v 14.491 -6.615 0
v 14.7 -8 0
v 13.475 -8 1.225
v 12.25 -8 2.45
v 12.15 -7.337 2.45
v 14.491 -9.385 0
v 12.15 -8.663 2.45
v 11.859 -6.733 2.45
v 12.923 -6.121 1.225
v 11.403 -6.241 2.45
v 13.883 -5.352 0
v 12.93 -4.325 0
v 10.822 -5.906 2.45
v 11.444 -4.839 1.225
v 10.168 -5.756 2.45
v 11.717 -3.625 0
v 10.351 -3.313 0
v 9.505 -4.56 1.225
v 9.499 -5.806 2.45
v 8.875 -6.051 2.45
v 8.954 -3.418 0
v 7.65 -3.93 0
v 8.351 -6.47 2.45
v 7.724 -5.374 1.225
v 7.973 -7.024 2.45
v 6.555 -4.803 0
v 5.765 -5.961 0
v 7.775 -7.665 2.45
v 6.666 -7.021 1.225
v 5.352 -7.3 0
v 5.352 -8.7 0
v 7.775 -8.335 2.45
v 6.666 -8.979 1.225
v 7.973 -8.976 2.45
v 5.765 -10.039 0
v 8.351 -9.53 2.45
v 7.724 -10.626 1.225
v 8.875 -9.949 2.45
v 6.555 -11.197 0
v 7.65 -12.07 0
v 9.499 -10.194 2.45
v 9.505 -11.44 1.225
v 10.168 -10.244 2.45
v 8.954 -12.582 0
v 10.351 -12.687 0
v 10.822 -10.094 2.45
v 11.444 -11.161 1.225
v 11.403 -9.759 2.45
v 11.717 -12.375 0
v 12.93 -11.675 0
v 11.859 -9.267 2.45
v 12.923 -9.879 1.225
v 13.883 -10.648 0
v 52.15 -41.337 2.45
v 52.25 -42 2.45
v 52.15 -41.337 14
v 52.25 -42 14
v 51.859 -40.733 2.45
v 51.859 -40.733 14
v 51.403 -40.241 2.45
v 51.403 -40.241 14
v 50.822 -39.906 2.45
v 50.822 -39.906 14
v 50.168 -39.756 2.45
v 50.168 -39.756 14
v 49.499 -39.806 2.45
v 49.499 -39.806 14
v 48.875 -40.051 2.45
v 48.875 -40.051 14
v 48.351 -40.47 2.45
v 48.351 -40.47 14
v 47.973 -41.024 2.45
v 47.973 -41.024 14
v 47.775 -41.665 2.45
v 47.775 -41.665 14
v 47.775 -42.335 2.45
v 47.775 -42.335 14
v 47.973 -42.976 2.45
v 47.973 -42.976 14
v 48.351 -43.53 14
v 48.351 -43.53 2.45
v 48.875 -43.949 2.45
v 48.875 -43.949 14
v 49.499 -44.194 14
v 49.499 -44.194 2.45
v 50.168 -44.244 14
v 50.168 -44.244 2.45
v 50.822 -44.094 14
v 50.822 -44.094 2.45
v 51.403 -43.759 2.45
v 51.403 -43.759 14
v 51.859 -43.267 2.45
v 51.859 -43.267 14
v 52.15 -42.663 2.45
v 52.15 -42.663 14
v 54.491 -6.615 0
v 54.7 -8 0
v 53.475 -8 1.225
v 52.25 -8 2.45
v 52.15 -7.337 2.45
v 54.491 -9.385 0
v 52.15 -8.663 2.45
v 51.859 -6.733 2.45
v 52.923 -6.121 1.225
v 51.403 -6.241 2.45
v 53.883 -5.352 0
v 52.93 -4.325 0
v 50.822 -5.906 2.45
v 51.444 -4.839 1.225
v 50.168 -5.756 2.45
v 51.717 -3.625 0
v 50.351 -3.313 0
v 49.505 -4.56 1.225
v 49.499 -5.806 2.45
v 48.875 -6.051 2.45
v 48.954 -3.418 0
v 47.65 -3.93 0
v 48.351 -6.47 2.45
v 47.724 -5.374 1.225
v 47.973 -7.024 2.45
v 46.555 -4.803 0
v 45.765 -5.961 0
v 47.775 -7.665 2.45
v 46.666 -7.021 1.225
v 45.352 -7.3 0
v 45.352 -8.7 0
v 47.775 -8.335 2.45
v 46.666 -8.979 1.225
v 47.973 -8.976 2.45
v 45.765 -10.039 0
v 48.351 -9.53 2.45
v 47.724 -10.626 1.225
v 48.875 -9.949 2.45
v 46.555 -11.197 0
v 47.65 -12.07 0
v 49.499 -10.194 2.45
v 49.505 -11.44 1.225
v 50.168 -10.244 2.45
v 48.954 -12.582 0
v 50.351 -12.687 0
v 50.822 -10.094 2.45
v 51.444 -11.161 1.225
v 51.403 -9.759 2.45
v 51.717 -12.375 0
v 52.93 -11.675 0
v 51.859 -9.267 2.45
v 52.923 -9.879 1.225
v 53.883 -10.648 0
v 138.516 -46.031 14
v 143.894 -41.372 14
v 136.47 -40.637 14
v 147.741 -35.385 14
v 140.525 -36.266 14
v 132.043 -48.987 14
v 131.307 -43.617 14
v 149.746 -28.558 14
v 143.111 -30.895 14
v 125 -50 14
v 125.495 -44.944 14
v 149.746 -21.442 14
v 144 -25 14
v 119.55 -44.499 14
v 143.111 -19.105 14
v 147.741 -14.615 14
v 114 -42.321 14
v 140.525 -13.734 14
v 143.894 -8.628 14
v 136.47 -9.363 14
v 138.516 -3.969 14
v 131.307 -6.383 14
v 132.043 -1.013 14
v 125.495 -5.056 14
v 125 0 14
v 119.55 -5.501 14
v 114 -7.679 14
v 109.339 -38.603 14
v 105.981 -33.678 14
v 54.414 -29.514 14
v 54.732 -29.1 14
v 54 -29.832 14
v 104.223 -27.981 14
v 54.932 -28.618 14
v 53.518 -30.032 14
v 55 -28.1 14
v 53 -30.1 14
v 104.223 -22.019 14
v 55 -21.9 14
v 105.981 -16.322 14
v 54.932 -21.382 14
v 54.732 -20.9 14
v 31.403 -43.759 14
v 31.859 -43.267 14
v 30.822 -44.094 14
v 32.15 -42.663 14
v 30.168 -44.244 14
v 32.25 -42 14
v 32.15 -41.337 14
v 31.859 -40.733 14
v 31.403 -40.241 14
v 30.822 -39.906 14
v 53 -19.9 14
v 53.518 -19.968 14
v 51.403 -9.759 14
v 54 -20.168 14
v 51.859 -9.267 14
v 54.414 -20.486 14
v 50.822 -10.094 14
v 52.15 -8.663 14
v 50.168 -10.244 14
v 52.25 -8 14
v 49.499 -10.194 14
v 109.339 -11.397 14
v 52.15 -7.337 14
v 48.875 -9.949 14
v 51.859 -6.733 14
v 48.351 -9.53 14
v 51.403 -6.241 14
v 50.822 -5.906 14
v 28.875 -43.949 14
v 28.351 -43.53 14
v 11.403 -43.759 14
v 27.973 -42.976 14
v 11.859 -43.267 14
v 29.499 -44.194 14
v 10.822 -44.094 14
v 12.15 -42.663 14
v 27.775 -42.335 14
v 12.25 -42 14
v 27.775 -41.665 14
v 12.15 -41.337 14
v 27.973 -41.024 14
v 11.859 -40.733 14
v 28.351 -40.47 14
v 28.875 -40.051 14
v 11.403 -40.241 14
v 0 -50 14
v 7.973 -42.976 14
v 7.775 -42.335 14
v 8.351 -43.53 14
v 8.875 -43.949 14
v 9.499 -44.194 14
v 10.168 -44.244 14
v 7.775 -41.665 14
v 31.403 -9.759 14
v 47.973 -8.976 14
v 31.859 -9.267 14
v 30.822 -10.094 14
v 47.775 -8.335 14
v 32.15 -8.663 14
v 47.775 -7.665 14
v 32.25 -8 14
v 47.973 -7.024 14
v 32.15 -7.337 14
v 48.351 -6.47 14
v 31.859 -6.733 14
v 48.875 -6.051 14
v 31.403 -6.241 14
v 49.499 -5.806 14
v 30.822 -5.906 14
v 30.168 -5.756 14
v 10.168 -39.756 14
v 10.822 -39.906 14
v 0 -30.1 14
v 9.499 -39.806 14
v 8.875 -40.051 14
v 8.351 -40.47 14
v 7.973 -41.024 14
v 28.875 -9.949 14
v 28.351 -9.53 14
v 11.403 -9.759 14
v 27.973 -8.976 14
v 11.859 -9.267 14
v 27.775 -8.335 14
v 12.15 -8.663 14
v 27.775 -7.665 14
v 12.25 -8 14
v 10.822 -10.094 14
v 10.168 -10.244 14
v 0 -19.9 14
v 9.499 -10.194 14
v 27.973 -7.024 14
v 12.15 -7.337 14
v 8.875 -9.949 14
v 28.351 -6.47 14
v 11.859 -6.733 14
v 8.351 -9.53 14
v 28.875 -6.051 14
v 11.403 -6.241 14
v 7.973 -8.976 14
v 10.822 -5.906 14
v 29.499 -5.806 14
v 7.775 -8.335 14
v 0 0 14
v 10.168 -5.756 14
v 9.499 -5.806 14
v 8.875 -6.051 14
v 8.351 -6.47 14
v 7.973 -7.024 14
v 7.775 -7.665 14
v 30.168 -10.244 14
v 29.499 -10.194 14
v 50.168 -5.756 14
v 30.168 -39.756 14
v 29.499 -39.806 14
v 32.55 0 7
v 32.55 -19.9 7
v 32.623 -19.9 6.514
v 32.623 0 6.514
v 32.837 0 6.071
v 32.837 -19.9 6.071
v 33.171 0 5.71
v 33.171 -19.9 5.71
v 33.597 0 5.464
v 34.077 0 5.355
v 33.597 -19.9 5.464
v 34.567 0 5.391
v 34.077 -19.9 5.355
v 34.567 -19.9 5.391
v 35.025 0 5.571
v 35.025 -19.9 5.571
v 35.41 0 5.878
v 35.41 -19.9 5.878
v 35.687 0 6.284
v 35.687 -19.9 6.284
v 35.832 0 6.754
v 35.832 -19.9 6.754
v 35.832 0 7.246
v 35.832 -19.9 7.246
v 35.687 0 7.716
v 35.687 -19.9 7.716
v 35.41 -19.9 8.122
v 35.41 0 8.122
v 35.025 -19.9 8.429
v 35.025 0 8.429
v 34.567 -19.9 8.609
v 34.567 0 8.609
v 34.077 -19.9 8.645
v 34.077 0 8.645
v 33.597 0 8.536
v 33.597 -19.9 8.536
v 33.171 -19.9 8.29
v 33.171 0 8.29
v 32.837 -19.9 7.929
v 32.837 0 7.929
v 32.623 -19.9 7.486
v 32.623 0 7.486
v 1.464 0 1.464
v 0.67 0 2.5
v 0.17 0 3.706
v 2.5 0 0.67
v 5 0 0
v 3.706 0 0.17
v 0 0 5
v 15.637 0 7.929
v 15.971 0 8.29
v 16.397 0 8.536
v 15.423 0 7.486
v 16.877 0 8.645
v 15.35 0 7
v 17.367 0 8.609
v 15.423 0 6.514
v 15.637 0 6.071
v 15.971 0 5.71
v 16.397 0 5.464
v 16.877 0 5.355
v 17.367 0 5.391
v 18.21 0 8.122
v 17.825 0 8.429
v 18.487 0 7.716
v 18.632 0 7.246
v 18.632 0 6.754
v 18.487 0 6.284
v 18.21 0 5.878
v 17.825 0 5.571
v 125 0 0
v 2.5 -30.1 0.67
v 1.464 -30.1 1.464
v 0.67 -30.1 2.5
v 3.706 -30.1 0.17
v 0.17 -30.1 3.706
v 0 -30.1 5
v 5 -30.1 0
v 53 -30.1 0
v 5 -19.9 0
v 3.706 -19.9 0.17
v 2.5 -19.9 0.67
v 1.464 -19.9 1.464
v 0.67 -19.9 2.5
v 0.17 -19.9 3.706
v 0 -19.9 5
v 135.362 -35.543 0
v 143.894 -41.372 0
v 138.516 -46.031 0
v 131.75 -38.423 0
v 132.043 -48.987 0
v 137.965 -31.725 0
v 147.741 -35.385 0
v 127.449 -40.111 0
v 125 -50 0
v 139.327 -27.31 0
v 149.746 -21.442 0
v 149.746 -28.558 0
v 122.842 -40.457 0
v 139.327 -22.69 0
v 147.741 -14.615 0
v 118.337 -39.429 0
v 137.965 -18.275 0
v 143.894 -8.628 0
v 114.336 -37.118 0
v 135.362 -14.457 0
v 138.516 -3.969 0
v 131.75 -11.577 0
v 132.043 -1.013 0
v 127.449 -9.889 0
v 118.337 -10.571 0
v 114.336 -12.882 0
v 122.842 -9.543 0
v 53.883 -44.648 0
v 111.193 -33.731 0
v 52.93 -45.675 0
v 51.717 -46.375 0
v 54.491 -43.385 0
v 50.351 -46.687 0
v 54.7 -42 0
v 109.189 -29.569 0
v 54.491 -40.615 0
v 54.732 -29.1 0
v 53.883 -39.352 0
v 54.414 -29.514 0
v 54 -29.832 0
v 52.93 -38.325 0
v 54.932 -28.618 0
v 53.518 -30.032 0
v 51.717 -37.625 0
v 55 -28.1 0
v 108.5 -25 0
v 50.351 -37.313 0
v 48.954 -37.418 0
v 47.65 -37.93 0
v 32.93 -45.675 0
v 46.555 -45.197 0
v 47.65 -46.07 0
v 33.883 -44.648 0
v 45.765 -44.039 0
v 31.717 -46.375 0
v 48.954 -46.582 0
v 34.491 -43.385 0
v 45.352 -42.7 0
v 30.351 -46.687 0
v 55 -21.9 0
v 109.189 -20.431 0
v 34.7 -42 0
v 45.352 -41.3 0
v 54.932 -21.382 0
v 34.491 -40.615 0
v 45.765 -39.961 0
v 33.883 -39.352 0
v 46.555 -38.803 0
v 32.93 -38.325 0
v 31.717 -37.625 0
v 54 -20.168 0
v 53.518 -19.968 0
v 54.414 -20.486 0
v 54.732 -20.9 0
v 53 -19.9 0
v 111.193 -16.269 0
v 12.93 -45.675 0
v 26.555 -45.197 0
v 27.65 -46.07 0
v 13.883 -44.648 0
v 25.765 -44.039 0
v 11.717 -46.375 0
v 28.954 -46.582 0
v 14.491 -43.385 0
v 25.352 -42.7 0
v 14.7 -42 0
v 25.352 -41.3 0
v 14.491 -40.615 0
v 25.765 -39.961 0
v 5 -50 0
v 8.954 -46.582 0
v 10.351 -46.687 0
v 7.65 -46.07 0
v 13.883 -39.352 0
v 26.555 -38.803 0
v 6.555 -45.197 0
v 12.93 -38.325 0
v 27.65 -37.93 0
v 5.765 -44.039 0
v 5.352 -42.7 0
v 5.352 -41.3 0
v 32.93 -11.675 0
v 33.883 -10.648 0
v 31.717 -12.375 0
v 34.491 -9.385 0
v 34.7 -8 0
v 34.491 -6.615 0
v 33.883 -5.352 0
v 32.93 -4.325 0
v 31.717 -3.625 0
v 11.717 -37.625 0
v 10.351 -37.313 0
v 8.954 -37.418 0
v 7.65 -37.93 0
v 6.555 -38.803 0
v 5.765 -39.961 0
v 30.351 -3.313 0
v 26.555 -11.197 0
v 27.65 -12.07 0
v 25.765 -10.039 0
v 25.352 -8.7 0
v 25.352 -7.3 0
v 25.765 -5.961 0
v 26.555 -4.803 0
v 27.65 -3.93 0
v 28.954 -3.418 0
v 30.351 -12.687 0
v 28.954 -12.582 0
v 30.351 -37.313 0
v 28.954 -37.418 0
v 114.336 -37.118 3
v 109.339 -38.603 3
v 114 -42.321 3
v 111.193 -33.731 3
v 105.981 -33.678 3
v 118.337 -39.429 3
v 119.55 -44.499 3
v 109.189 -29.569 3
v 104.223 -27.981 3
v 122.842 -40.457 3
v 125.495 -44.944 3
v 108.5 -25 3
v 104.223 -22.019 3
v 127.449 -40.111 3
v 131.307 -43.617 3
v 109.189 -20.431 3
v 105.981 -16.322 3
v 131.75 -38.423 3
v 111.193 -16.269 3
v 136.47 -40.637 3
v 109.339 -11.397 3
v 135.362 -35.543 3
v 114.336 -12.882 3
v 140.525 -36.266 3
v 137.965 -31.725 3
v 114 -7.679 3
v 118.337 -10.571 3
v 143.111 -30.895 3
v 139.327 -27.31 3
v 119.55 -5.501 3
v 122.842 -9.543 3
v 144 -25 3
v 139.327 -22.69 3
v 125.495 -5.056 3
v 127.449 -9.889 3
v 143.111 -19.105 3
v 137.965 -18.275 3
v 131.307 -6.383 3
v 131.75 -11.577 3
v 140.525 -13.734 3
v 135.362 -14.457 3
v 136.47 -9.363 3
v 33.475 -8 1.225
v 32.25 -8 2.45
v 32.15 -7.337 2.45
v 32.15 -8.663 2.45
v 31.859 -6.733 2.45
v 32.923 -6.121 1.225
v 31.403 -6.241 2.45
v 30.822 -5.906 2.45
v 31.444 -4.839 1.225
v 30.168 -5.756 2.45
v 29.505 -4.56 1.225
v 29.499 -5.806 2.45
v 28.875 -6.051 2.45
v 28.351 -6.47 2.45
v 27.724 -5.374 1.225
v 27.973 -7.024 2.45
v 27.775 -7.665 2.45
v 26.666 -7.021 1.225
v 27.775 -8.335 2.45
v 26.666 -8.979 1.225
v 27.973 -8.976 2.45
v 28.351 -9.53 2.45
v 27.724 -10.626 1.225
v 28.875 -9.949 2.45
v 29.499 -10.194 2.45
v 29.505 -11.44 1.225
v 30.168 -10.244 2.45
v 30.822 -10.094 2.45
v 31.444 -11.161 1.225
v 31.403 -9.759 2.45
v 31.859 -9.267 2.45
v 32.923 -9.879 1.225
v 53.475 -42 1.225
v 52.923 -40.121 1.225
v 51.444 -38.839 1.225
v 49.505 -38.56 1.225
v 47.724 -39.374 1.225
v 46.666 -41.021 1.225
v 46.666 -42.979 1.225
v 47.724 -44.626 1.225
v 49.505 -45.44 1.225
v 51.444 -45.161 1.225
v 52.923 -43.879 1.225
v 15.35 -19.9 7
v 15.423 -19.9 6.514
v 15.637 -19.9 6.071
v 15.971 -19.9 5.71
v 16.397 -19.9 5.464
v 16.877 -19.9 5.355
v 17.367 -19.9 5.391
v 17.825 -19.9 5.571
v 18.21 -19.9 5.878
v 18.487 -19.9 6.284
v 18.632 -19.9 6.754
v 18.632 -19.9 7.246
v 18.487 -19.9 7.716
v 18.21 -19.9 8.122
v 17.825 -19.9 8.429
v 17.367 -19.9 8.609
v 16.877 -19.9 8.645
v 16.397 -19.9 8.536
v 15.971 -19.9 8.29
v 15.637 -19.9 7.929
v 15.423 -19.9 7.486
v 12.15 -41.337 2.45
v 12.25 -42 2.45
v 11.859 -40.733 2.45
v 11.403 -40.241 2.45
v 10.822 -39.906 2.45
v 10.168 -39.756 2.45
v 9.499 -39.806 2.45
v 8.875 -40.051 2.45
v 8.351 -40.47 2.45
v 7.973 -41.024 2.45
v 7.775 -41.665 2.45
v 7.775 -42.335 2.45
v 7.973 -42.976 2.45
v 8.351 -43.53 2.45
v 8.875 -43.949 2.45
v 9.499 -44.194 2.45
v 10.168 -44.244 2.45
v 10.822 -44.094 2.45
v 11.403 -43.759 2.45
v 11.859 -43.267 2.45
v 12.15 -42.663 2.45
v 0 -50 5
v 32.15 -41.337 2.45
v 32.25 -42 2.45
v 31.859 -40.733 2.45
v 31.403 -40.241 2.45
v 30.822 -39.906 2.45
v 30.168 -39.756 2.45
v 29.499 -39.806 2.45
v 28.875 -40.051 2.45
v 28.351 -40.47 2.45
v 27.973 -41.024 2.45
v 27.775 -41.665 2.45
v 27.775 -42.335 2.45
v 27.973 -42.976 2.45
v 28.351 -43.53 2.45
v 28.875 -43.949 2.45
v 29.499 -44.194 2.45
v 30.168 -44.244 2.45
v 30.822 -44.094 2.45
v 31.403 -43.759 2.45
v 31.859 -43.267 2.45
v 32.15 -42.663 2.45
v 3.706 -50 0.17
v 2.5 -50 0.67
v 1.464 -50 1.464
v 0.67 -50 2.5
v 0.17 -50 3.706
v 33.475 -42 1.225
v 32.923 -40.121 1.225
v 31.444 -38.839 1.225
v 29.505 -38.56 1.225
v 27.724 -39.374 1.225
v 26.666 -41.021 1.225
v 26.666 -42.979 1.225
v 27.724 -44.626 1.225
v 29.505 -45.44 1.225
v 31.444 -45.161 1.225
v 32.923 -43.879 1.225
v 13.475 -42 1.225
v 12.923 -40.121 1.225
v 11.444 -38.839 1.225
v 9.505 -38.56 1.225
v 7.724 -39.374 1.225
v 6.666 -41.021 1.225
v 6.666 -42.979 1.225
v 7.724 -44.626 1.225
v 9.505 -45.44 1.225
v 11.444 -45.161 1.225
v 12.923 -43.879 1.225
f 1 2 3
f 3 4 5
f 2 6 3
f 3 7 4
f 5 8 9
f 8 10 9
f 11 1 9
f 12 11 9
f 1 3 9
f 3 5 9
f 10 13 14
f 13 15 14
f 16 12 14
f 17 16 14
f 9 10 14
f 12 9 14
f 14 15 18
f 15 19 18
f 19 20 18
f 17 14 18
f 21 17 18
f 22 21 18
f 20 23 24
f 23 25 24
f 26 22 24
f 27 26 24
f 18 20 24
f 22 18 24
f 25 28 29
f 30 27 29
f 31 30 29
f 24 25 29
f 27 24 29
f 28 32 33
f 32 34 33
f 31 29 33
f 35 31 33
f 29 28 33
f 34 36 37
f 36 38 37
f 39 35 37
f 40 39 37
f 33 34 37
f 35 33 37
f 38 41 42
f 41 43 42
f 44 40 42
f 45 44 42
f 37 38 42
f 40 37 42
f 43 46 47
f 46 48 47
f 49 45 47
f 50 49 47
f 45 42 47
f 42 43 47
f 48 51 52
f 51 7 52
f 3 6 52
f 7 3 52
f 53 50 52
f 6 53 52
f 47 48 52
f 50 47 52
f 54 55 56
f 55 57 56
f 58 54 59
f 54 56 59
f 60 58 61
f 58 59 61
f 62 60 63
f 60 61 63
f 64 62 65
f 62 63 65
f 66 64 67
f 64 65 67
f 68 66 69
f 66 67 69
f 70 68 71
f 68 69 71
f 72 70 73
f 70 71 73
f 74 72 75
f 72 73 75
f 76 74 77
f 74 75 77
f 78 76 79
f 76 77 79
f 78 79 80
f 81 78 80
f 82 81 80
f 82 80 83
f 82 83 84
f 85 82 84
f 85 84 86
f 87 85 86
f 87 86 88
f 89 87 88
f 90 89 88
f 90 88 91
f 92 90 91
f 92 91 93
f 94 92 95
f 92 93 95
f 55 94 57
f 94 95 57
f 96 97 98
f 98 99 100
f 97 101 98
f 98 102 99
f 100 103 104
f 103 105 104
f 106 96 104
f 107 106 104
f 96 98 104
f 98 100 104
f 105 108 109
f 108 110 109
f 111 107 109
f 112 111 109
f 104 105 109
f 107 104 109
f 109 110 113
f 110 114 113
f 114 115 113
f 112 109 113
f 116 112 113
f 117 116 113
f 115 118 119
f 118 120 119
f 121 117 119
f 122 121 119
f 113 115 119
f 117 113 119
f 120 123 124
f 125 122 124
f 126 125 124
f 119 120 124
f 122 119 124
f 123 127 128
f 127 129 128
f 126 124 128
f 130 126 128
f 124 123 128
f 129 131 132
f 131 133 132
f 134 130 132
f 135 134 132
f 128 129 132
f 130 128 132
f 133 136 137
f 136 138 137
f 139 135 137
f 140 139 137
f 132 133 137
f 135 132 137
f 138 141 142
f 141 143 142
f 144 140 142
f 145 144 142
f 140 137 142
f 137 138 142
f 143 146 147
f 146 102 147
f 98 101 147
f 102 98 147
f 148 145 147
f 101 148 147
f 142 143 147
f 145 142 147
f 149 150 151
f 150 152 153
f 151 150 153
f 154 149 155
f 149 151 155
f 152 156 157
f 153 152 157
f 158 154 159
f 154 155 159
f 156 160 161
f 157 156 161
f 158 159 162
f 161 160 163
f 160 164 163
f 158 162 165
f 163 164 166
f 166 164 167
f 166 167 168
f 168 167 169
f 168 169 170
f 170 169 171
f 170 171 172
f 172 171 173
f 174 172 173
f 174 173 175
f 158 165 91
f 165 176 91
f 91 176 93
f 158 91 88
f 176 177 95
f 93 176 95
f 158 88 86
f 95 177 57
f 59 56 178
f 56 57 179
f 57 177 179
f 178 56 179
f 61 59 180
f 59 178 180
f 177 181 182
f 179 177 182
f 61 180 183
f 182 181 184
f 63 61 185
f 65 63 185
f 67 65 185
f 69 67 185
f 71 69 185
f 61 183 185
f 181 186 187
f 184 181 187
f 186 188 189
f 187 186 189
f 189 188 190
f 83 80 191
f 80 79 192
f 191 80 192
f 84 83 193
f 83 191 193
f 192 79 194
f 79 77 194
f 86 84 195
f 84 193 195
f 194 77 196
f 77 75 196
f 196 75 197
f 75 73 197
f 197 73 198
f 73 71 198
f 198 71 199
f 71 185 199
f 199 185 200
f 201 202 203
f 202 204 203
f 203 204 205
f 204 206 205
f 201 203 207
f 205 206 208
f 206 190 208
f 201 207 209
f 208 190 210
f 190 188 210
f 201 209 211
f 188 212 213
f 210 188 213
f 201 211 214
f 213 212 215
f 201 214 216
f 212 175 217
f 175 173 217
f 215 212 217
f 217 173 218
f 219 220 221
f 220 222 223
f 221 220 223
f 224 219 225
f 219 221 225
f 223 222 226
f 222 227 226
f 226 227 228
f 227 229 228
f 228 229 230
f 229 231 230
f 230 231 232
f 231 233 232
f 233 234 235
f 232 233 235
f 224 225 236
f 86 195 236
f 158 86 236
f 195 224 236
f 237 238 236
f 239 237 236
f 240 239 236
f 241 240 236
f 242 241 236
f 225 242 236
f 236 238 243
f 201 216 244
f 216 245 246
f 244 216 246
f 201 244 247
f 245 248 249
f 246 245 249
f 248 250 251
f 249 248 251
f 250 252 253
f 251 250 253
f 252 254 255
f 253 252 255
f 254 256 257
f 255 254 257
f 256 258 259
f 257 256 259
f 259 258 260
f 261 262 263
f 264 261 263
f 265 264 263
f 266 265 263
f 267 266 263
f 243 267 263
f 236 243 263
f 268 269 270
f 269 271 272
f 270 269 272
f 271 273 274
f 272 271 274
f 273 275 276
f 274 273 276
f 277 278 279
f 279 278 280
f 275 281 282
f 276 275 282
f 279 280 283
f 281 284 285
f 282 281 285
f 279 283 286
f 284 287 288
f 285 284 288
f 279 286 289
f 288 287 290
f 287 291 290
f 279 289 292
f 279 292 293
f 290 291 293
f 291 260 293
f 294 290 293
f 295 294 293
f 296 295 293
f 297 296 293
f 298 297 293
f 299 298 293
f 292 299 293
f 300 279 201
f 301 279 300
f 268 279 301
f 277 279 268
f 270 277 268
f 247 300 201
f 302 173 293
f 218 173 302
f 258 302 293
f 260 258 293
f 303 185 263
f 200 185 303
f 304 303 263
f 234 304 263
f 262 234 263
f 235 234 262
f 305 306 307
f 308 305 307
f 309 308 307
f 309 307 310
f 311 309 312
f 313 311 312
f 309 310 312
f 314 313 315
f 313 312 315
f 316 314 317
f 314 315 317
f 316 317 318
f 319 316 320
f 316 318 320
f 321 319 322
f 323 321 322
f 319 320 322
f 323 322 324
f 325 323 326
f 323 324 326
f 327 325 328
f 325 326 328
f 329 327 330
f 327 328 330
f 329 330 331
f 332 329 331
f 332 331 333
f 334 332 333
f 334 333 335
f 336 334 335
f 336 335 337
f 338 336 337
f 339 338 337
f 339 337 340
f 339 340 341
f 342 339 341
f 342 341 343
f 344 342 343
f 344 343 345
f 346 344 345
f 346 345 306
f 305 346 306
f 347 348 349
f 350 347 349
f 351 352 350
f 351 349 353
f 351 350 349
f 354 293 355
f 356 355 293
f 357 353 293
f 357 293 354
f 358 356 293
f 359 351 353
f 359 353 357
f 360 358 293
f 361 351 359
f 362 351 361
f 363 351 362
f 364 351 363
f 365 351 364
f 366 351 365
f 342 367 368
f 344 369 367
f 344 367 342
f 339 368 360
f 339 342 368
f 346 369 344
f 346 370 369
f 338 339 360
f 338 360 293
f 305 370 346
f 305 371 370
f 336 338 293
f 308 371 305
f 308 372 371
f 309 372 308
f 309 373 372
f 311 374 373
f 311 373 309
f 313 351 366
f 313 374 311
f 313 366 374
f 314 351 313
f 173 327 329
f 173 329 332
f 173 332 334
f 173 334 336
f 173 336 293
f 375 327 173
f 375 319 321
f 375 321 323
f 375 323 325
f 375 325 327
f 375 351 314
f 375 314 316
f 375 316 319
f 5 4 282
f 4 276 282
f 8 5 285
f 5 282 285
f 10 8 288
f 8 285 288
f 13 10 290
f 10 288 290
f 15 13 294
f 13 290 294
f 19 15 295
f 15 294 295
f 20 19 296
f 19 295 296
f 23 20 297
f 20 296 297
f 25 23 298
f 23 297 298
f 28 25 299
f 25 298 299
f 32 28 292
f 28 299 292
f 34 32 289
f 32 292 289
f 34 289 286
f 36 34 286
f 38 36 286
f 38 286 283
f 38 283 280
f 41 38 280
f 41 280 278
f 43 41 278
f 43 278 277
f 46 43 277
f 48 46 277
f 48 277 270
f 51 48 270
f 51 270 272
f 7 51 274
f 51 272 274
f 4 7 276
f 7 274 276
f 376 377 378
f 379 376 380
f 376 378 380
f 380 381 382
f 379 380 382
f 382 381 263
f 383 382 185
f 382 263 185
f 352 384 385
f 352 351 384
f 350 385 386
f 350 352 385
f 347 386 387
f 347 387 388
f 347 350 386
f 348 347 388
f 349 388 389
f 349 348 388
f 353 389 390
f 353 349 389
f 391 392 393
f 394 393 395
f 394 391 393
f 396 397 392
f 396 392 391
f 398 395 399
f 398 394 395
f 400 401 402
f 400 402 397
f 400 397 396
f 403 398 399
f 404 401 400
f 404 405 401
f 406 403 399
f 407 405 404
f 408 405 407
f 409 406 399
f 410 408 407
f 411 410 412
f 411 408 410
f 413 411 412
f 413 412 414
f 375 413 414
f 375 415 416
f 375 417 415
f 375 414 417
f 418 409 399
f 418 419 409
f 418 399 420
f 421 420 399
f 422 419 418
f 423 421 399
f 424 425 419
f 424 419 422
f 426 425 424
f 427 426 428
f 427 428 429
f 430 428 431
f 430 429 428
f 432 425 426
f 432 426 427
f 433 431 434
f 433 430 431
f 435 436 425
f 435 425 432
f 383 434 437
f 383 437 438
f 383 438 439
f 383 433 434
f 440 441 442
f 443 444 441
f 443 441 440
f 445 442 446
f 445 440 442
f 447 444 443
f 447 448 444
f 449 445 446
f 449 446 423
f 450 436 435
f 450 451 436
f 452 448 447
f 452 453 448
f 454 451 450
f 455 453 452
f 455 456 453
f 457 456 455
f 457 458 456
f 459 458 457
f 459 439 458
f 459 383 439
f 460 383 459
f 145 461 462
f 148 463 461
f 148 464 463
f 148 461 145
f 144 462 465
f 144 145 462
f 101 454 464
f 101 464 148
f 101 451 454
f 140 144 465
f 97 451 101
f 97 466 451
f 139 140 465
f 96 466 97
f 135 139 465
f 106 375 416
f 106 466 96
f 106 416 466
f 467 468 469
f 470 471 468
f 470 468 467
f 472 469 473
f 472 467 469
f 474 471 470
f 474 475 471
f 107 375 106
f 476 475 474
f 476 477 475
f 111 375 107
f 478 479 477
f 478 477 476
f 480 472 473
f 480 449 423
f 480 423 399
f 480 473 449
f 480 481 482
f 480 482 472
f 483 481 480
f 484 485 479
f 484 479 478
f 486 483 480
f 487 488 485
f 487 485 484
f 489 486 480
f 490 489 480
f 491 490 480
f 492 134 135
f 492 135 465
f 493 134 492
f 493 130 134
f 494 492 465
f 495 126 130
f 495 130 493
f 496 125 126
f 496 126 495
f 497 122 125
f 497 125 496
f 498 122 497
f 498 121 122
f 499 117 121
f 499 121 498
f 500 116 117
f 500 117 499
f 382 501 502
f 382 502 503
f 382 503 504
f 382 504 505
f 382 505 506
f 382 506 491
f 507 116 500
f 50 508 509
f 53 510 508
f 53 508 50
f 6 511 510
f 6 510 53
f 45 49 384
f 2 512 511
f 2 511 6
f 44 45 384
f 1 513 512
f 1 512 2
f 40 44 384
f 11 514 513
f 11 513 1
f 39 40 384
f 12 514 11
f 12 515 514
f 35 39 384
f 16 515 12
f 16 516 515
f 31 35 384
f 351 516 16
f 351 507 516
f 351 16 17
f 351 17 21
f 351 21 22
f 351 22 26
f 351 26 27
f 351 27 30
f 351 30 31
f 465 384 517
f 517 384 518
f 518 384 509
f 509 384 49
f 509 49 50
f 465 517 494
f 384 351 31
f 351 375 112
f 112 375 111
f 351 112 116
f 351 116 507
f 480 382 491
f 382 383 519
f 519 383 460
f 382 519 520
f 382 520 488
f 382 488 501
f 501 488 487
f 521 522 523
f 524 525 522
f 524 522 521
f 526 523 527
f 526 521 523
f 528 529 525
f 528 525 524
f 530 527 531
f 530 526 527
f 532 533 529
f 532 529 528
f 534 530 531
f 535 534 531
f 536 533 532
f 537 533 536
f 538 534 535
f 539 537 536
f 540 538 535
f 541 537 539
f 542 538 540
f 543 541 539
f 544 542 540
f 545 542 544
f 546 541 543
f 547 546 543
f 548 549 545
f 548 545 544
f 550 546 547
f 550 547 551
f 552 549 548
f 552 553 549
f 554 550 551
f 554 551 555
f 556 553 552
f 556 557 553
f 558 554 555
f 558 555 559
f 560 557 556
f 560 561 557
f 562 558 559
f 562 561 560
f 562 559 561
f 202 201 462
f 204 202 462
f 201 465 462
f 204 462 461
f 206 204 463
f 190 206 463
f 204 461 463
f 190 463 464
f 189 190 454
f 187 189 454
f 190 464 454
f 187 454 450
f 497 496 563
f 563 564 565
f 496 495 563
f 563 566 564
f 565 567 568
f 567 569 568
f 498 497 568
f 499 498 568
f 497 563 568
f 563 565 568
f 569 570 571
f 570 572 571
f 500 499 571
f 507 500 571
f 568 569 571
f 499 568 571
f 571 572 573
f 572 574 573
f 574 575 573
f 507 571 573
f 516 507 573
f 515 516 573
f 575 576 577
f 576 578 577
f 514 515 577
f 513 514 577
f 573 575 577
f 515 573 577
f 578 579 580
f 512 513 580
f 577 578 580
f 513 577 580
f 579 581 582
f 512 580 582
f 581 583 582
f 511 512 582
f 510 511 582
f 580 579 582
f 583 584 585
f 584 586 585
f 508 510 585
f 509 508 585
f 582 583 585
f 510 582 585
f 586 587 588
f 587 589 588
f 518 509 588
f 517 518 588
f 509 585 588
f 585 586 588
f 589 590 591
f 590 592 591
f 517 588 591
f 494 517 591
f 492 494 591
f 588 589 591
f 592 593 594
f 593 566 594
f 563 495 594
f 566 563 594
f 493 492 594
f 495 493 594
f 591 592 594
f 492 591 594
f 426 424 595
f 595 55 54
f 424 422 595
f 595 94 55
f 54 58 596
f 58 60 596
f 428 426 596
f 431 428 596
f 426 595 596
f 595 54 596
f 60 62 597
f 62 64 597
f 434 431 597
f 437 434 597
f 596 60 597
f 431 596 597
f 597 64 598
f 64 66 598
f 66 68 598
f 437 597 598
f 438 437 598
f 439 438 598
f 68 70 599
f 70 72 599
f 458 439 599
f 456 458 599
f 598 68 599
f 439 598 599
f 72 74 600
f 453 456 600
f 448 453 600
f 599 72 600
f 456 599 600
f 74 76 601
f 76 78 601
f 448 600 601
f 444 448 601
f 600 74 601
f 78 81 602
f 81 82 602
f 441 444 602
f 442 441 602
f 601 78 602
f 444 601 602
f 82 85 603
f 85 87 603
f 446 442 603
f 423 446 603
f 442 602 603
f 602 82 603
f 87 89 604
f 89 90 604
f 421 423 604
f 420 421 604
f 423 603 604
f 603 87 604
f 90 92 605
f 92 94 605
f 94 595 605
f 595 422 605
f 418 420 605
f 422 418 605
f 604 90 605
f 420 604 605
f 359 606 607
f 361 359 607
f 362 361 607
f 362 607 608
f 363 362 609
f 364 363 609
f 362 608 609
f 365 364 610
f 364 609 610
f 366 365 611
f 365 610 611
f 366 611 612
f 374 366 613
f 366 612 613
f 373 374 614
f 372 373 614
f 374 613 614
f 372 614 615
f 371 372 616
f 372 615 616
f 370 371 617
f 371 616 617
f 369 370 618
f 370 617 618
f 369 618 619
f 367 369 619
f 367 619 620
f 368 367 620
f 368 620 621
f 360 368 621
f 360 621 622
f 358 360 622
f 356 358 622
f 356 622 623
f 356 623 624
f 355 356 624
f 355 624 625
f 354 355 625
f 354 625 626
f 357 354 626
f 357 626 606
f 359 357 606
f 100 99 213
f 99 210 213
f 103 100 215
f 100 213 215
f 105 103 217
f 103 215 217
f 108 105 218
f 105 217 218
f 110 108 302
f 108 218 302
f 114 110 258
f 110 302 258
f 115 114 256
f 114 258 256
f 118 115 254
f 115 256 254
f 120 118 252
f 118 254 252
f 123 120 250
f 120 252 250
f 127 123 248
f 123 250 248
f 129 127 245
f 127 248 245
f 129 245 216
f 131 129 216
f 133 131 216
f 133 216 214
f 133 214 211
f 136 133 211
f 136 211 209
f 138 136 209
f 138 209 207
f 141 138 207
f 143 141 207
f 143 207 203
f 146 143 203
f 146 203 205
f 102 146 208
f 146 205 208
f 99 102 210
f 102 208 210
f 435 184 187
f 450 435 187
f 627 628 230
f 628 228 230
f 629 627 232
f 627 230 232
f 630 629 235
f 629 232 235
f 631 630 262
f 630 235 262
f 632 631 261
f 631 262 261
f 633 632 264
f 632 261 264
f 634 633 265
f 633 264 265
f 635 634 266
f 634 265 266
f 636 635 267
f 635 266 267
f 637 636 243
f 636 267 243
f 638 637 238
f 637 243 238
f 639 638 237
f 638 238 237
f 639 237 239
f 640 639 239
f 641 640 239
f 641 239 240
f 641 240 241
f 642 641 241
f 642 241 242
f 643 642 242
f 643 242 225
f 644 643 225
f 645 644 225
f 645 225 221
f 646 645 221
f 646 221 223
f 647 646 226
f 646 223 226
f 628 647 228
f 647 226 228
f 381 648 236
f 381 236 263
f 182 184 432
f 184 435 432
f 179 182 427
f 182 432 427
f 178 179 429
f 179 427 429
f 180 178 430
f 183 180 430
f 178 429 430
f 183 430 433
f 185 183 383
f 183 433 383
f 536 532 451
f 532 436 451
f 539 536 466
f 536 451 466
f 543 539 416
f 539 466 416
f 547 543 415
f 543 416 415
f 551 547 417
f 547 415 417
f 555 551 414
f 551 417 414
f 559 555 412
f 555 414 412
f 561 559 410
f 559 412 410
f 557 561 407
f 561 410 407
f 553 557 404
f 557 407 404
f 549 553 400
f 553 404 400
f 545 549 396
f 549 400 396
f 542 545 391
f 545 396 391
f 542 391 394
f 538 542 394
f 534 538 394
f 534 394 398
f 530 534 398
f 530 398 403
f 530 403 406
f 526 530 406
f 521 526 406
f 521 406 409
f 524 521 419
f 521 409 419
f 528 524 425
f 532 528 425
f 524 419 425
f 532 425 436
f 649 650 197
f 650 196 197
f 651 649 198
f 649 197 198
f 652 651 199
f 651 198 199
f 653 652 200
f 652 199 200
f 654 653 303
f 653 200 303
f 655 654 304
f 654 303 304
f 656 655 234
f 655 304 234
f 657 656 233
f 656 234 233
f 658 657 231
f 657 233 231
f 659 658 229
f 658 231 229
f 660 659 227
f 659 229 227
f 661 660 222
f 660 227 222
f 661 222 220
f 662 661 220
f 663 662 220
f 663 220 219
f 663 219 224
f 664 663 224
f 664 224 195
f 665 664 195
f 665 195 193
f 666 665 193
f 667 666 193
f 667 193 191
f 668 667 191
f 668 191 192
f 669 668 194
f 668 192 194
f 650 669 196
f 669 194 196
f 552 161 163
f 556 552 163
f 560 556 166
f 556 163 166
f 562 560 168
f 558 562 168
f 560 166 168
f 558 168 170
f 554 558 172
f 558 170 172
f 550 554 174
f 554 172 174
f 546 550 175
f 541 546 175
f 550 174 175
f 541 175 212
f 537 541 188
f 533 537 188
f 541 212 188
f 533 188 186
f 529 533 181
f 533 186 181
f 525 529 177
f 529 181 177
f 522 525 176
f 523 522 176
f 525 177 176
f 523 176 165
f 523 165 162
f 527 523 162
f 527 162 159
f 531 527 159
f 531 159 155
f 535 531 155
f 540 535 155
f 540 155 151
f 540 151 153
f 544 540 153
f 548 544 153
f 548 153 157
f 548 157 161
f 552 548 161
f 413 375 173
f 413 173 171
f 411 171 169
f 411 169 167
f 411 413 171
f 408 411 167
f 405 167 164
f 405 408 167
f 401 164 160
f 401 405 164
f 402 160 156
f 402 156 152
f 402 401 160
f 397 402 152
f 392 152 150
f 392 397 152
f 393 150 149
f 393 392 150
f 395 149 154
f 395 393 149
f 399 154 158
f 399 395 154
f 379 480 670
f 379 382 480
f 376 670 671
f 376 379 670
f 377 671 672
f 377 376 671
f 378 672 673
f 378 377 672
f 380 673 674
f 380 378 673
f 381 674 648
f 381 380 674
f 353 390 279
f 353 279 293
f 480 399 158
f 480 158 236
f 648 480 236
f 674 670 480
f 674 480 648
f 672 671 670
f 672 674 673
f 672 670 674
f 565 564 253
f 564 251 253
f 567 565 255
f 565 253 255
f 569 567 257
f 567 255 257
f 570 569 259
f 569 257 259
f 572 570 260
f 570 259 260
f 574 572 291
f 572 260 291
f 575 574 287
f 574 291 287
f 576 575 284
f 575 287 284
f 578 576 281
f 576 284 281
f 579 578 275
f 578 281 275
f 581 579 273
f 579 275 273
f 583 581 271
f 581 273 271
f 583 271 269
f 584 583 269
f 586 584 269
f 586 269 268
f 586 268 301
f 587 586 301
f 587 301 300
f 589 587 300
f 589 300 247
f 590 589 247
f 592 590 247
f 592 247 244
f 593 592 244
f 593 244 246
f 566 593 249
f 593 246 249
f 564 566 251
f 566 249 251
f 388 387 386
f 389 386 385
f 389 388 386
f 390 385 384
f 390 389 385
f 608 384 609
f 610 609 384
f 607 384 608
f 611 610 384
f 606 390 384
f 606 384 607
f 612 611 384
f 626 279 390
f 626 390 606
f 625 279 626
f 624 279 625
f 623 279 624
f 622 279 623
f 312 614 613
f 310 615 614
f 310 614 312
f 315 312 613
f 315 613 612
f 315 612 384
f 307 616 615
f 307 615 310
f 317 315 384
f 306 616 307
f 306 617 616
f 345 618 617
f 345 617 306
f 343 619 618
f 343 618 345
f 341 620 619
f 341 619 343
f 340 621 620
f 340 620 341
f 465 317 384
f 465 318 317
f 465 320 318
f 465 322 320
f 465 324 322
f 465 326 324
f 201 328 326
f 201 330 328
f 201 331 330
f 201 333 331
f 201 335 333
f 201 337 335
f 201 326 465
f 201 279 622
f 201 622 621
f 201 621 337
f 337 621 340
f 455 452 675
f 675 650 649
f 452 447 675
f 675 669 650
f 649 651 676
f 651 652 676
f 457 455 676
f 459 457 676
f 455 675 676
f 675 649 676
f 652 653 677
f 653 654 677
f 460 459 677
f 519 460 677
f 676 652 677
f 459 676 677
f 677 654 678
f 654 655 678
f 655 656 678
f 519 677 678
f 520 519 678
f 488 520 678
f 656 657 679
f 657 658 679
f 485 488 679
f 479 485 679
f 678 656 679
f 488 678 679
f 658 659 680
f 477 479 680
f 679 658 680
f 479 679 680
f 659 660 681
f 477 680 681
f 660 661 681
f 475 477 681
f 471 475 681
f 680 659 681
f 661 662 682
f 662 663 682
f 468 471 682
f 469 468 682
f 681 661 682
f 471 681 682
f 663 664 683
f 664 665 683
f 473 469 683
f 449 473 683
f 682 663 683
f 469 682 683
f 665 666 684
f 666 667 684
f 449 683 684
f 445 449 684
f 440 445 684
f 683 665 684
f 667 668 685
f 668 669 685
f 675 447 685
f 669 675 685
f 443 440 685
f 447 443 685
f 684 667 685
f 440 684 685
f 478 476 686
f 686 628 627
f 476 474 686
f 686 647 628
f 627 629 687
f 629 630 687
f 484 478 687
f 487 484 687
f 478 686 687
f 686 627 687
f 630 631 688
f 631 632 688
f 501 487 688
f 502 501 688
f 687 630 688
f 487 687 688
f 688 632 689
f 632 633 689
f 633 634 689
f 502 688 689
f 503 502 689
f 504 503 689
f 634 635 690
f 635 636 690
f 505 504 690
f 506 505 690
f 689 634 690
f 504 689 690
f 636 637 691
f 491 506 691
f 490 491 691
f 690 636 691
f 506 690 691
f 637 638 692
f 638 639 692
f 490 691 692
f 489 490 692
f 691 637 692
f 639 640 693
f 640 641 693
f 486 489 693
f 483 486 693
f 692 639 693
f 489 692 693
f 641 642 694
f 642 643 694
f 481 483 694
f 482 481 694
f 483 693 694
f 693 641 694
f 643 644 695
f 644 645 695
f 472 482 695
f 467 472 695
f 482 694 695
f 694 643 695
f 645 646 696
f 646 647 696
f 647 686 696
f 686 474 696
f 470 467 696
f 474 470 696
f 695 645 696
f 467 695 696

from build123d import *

# Parameters (mm, degrees)
BOSS_EXTRUDE1_DEPTH                             = 14
SKETCH2_W                                       = 55
SKETCH2_H                                       = 10.2
CUT_EXTRUDE1_DEPTH                              = 159.732479348
CSK_FOR_M4_FLAT_HEAD_MACHINE_SCREW1_D           = 4.5
CSK_FOR_M4_FLAT_HEAD_MACHINE_SCREW1_CSINK_D     = 9.4
CSK_FOR_M4_FLAT_HEAD_MACHINE_SCREW1_CSINK_ANGLE = 90
M4X0_7_TAPPED_HOLE1_D                           = 3.3
M4X0_7_TAPPED_HOLE1_DEPTH                       = 19.899999999
HOLE1_D                                         = 31.000000009
HOLE1_CBORE_D                                   = 40.00000001
HOLE1_CBORE_DEPTH                               = 11
FILLET1_R                                       = 2
FILLET2_R                                       = 5


with BuildPart() as part:
    # Sketch1 → Boss-Extrude1 (new body)
    with BuildSketch(Plane(origin=(0, 0, 0), x_dir=(-1, 0, 0), z_dir=(0, 0, -1))):
        with BuildLine():
            Line((0, 0), (-125, 0))
            ThreePointArc((-125, 0), (-150, -25), (-125, -50))
            Line((-125, -50), (0, -50))
            Line((0, -50), (0, 0))
        make_face()
    extrude(amount=-BOSS_EXTRUDE1_DEPTH)

    # Sketch2 → Cut-Extrude1 (cut, through all)
    with BuildSketch(Plane.XY.offset(14)):
        with Locations((27.5, -24.999999999)):
            Rectangle(SKETCH2_W, SKETCH2_H)
    extrude(amount=-CUT_EXTRUDE1_DEPTH, mode=Mode.SUBTRACT)

    # CSK for M4 Flat Head Machine Screw1 (through all)
    with Locations(Plane(origin=(0, 0, 0), x_dir=(-1, 0, 0), z_dir=(0, 0, -1))):
        with Locations((-10, -8), (-10, -42), (-30, -42), (-30, -8), (-50, -8), (-50, -42)):
            CounterSinkHole(CSK_FOR_M4_FLAT_HEAD_MACHINE_SCREW1_D / 2, CSK_FOR_M4_FLAT_HEAD_MACHINE_SCREW1_CSINK_D / 2, counter_sink_angle=CSK_FOR_M4_FLAT_HEAD_MACHINE_SCREW1_CSINK_ANGLE)

    # M4x0.7 Tapped Hole1
    with Locations(Plane(origin=(0, 0, 0), x_dir=(1, 0, 0), z_dir=(0, 1, 0))):
        with Locations((17, -7), (34.2, -7)):
            Hole(M4X0_7_TAPPED_HOLE1_D / 2, depth=M4X0_7_TAPPED_HOLE1_DEPTH)

    # Hole1 (through all)
    with Locations(Plane.XY.offset(14)):
        with Locations((123.999999995, -24.999999999)):
            CounterBoreHole(HOLE1_D / 2, HOLE1_CBORE_D / 2, HOLE1_CBORE_DEPTH)

    # Fillet1
    fillet1_edges = [part.edges().sort_by_distance(p)[0] for p in [
        (55, -19.899999999, 7),
        (55, -30.099999999, 7),
    ]]
    fillet(fillet1_edges, radius=FILLET1_R)

    # Fillet2
    fillet2_edges = [part.edges().sort_by_distance(p)[0] for p in [
        (0, -9.95, 0),
        (0, -40.05, 0),
    ]]
    fillet(fillet2_edges, radius=FILLET2_R)


solid = part.part
